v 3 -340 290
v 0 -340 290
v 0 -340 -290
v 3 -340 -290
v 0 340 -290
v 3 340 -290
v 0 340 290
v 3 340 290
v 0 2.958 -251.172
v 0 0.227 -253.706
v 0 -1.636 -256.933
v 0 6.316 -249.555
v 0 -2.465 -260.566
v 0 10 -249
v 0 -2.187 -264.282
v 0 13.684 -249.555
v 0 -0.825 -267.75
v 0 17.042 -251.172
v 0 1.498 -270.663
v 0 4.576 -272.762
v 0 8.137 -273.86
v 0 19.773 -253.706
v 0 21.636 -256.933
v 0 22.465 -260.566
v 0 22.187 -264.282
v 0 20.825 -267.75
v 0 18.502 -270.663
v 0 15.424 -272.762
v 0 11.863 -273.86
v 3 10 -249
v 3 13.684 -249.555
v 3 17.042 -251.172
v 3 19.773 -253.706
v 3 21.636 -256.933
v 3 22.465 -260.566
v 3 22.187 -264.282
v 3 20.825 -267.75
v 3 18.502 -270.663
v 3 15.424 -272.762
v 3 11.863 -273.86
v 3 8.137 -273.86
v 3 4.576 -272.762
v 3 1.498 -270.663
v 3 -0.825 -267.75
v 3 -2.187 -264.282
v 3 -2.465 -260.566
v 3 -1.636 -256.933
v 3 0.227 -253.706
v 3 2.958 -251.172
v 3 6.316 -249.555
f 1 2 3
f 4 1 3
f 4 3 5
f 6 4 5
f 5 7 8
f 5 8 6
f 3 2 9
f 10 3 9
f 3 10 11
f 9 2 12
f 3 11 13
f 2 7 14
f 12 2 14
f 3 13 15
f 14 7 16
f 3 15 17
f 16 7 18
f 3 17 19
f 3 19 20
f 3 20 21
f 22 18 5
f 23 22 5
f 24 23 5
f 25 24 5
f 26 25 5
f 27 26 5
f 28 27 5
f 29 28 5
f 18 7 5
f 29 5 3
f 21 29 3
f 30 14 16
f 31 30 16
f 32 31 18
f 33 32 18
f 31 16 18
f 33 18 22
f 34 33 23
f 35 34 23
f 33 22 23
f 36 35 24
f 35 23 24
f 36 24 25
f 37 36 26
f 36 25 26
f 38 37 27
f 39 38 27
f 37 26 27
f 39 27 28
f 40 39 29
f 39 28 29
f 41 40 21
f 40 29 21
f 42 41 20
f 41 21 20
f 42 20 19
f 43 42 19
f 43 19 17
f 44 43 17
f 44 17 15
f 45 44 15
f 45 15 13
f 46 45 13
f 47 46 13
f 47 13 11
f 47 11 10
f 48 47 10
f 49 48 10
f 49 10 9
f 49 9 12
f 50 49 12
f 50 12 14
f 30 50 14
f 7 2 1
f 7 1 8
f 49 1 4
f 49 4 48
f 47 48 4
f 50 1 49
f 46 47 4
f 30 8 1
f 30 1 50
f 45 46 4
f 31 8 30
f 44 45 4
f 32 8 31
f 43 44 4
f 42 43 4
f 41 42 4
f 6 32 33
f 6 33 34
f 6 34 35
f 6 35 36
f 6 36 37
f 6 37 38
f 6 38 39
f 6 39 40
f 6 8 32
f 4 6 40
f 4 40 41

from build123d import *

# Parameters (mm, degrees)
CROQUIS1_W              = 580
CROQUIS1_H              = 680
SALIENTE_EXTRUIR1_DEPTH = 3
CORTAR_EXTRUIR1_REACH   = 448.888
CROQUIS2_R              = 12.5


with BuildPart() as part:
    # Croquis1 → Saliente-Extruir1 (new body)
    with BuildSketch(Plane(origin=(0, 0, 0), x_dir=(0, 0, -1), z_dir=(1, 0, 0))):
        Rectangle(CROQUIS1_W, CROQUIS1_H)
    extrude(amount=SALIENTE_EXTRUIR1_DEPTH)

    # Croquis2 → Cortar-Extruir1 (cut, up to next)
    with BuildSketch(Plane.ZY, mode=Mode.PRIVATE) as cortar_extruir1_sk1:
        with Locations((-261.5, 10)):
            Circle(CROQUIS2_R)
    cortar_extruir1_tool1 = extrude(cortar_extruir1_sk1.sketch, amount=-CORTAR_EXTRUIR1_REACH, mode=Mode.PRIVATE) & part.part
    add(cortar_extruir1_tool1.solids().sort_by_distance((0, 10, -261.5))[0], mode=Mode.SUBTRACT)


solid = part.part
